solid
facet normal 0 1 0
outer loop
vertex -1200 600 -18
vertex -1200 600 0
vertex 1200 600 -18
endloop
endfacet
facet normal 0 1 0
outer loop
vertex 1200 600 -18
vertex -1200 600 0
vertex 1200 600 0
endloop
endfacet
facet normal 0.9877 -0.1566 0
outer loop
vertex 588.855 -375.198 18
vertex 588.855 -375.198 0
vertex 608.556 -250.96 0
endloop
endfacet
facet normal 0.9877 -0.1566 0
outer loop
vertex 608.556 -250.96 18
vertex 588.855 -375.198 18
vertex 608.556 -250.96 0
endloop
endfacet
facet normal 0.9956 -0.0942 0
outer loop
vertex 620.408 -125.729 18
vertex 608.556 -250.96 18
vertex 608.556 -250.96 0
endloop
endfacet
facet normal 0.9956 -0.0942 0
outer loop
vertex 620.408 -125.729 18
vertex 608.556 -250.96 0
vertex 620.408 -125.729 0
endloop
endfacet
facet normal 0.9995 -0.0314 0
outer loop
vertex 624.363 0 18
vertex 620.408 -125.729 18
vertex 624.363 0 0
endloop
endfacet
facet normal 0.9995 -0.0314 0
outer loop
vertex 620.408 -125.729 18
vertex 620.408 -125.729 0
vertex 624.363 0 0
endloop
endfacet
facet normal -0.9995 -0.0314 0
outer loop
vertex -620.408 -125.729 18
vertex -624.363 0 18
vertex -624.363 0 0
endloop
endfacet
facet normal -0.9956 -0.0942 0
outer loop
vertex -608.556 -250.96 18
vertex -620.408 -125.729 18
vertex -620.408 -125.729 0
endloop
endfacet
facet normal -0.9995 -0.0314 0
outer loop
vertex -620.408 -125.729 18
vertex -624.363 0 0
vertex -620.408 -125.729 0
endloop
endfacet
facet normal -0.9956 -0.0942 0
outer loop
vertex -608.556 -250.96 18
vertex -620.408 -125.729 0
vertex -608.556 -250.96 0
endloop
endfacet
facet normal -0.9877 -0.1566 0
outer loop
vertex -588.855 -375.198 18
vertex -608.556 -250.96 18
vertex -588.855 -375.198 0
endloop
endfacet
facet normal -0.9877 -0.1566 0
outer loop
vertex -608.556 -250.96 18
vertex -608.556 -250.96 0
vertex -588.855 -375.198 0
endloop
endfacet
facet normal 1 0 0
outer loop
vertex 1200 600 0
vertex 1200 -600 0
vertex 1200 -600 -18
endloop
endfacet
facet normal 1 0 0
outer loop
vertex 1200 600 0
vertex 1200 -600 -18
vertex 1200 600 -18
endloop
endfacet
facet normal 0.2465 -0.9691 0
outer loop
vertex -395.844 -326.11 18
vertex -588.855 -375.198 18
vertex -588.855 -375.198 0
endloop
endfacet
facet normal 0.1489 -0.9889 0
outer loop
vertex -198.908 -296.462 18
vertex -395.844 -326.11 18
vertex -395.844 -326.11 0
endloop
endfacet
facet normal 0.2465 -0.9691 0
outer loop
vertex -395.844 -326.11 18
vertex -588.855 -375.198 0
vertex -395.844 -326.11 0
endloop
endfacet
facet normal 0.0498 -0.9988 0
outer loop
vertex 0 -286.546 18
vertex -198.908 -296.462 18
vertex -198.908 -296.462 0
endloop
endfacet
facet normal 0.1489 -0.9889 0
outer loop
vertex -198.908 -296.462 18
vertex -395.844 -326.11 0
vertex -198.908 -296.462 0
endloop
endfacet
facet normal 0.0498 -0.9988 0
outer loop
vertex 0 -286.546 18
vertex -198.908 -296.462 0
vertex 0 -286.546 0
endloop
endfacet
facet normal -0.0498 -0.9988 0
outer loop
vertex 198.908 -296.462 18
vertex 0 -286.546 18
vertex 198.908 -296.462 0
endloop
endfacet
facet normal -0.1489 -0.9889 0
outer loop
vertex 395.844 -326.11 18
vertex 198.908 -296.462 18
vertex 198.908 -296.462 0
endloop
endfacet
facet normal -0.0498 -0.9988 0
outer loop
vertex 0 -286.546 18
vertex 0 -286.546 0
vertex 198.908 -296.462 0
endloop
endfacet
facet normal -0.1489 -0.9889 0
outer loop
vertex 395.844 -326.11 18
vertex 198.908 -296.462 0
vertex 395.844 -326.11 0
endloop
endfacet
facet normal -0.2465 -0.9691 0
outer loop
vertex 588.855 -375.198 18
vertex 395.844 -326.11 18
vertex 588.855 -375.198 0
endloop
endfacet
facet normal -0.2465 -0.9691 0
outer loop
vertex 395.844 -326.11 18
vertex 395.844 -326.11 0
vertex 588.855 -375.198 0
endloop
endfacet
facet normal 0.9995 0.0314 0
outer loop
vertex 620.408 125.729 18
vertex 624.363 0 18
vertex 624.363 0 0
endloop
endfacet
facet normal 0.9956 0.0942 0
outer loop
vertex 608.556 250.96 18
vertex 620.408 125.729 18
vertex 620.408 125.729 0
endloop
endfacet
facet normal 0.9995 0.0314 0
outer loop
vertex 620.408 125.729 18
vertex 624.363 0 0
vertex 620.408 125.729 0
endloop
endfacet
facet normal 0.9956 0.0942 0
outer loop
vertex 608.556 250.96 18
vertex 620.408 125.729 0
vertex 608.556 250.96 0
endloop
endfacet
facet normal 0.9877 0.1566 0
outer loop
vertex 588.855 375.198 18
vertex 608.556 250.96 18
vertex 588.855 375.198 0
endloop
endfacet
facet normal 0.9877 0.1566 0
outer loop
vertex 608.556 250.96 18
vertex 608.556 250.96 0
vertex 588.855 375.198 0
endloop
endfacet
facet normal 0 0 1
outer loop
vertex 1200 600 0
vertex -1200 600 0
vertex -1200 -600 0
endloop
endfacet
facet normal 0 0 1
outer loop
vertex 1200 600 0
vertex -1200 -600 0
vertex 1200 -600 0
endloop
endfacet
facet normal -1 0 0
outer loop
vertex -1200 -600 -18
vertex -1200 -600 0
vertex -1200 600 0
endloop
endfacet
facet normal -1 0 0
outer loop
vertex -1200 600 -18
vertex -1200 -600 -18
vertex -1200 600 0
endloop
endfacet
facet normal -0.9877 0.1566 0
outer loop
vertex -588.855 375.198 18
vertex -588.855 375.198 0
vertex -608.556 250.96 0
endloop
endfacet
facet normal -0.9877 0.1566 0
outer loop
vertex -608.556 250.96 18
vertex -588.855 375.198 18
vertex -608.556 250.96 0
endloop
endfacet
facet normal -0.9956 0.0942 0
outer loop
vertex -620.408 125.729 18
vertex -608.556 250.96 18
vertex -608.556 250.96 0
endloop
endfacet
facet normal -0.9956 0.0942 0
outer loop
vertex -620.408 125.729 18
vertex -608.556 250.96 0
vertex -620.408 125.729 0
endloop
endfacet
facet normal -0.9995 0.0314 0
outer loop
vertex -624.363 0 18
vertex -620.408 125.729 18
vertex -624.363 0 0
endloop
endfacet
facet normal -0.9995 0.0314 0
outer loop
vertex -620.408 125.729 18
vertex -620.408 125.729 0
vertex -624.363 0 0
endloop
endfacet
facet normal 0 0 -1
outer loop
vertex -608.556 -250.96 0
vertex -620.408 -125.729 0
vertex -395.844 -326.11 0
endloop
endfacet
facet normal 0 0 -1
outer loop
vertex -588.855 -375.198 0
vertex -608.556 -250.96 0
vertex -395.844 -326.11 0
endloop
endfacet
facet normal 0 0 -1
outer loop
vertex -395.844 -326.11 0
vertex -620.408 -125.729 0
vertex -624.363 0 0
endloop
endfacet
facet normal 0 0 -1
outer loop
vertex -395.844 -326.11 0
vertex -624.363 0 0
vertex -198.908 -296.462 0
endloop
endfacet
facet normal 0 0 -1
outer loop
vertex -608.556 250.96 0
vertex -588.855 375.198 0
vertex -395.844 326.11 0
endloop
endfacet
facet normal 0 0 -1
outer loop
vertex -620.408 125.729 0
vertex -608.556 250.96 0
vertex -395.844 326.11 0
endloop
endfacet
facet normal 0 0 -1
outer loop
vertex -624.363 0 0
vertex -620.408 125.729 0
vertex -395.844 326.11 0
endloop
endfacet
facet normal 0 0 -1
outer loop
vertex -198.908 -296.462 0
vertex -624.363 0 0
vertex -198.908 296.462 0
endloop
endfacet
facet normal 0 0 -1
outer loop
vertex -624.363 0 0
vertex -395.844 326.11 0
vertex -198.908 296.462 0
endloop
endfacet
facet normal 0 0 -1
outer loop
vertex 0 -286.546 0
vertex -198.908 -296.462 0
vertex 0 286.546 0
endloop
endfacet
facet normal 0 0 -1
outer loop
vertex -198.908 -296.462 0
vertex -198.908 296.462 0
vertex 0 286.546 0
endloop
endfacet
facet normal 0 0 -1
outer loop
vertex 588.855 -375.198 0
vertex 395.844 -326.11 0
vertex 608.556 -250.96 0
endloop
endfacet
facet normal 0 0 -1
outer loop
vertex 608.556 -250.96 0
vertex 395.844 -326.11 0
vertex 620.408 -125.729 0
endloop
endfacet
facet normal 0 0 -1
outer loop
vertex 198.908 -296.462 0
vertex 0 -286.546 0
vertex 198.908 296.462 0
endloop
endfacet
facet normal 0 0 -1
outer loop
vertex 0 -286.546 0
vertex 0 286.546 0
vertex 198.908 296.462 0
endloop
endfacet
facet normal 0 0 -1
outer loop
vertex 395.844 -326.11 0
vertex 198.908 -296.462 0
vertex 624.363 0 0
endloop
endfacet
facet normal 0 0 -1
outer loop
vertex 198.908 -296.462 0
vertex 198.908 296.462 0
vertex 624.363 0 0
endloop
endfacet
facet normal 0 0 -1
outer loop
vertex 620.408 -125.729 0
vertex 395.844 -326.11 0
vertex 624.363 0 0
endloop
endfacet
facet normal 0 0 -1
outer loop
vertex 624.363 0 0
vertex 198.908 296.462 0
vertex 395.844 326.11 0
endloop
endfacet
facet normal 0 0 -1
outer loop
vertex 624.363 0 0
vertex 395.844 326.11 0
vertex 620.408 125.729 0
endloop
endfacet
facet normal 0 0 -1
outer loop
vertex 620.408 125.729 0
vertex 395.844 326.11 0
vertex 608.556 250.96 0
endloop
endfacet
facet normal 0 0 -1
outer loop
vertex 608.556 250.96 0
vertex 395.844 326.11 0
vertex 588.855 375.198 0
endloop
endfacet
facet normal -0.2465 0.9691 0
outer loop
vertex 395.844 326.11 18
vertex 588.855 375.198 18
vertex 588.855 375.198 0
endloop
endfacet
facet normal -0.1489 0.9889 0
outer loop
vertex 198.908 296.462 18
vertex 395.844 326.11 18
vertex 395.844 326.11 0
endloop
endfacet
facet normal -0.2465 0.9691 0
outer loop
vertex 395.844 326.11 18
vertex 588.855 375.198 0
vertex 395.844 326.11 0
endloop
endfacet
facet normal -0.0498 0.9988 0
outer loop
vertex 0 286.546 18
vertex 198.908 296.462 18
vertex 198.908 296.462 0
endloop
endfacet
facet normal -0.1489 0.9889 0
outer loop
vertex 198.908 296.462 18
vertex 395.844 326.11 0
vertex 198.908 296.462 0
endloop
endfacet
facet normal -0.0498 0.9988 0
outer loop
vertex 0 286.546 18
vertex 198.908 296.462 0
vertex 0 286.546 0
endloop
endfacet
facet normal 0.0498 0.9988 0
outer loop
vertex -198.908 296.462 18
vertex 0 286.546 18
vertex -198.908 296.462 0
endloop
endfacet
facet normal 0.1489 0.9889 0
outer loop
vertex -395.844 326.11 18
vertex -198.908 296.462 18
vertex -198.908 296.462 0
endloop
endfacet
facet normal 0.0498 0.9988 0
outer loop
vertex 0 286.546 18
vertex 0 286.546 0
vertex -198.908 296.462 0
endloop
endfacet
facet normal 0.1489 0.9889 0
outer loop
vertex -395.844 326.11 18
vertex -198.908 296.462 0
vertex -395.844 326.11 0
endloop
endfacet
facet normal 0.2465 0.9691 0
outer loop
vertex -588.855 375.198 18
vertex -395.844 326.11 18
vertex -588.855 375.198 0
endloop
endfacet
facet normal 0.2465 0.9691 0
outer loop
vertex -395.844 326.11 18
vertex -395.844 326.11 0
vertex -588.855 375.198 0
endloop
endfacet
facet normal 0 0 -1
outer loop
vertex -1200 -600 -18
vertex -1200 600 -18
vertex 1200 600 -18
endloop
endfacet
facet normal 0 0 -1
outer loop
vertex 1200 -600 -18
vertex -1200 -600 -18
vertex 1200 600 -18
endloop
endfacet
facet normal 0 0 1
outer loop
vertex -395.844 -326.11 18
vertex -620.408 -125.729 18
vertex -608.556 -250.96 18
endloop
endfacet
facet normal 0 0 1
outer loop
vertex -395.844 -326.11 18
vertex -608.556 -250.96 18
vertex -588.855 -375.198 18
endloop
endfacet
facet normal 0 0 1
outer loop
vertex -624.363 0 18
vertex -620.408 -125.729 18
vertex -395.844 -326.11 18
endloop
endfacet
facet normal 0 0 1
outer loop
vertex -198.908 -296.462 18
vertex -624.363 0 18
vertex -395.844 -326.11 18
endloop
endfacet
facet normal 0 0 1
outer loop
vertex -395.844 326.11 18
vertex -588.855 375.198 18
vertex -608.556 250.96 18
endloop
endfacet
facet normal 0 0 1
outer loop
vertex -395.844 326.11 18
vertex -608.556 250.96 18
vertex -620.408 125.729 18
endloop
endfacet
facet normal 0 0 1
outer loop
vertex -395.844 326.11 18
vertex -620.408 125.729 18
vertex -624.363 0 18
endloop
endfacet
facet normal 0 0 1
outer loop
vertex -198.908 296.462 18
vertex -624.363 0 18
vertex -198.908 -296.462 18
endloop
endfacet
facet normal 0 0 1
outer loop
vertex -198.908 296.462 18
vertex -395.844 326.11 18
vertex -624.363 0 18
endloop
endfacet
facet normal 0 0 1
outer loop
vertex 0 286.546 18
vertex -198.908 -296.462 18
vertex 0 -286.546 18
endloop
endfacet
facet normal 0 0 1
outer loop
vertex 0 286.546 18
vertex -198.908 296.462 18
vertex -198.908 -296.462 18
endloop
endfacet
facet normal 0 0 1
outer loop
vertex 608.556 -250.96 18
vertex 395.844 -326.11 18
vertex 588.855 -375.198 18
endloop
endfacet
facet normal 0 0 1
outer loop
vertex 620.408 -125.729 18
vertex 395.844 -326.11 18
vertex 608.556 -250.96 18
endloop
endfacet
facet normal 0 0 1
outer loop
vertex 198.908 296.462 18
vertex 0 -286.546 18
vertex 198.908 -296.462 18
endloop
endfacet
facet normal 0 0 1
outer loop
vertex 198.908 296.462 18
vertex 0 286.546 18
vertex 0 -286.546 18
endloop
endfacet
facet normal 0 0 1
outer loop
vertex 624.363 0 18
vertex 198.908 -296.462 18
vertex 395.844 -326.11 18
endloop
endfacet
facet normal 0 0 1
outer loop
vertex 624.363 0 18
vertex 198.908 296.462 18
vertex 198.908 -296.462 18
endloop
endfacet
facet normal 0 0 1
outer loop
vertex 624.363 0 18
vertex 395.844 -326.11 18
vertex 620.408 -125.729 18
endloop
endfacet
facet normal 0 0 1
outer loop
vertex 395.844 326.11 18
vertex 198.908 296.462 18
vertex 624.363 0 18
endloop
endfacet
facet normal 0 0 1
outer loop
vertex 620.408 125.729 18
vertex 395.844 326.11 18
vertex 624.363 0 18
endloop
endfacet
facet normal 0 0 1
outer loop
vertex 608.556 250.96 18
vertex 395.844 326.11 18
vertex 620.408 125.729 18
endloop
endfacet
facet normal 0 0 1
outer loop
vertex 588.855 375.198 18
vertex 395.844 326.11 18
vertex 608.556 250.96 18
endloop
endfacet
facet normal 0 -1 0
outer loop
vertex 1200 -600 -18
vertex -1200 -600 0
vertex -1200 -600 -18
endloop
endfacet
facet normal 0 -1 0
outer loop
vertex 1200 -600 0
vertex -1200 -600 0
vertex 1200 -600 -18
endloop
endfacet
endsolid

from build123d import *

# Parameters (mm, degrees)
F1_DEPTH = 18
F2_W     = 2400
F2_H     = 1200
F3_DEPTH = 18


with BuildPart() as f1:
    # F0 (on Top) → F1 (new body)
    with BuildSketch(Plane.XY):
        with BuildLine():
            ThreePointArc((588.854787, 375.198188), (0, 286.54589), (-588.854787, 375.198188))
            ThreePointArc((-588.854787, 375.198188), (-615.466475, 188.437352), (-624.363422, 0))
            ThreePointArc((-624.363422, 0), (-615.466475, -188.437352), (-588.854787, -375.198188))
            ThreePointArc((-588.854787, -375.198188), (0, -286.54589), (588.854787, -375.198188))
            ThreePointArc((588.854787, -375.198188), (615.466475, -188.437352), (624.363422, 0))
            ThreePointArc((624.363422, 0), (615.466475, 188.437352), (588.854787, 375.198188))
        make_face()
    extrude(amount=F1_DEPTH)


with BuildPart() as f3:
    # F2 (on Top) → F3 (new body)
    with BuildSketch(Plane.XY):
        Rectangle(F2_W, F2_H)
    extrude(amount=-F3_DEPTH)


solid = Compound([f1.part, f3.part])
